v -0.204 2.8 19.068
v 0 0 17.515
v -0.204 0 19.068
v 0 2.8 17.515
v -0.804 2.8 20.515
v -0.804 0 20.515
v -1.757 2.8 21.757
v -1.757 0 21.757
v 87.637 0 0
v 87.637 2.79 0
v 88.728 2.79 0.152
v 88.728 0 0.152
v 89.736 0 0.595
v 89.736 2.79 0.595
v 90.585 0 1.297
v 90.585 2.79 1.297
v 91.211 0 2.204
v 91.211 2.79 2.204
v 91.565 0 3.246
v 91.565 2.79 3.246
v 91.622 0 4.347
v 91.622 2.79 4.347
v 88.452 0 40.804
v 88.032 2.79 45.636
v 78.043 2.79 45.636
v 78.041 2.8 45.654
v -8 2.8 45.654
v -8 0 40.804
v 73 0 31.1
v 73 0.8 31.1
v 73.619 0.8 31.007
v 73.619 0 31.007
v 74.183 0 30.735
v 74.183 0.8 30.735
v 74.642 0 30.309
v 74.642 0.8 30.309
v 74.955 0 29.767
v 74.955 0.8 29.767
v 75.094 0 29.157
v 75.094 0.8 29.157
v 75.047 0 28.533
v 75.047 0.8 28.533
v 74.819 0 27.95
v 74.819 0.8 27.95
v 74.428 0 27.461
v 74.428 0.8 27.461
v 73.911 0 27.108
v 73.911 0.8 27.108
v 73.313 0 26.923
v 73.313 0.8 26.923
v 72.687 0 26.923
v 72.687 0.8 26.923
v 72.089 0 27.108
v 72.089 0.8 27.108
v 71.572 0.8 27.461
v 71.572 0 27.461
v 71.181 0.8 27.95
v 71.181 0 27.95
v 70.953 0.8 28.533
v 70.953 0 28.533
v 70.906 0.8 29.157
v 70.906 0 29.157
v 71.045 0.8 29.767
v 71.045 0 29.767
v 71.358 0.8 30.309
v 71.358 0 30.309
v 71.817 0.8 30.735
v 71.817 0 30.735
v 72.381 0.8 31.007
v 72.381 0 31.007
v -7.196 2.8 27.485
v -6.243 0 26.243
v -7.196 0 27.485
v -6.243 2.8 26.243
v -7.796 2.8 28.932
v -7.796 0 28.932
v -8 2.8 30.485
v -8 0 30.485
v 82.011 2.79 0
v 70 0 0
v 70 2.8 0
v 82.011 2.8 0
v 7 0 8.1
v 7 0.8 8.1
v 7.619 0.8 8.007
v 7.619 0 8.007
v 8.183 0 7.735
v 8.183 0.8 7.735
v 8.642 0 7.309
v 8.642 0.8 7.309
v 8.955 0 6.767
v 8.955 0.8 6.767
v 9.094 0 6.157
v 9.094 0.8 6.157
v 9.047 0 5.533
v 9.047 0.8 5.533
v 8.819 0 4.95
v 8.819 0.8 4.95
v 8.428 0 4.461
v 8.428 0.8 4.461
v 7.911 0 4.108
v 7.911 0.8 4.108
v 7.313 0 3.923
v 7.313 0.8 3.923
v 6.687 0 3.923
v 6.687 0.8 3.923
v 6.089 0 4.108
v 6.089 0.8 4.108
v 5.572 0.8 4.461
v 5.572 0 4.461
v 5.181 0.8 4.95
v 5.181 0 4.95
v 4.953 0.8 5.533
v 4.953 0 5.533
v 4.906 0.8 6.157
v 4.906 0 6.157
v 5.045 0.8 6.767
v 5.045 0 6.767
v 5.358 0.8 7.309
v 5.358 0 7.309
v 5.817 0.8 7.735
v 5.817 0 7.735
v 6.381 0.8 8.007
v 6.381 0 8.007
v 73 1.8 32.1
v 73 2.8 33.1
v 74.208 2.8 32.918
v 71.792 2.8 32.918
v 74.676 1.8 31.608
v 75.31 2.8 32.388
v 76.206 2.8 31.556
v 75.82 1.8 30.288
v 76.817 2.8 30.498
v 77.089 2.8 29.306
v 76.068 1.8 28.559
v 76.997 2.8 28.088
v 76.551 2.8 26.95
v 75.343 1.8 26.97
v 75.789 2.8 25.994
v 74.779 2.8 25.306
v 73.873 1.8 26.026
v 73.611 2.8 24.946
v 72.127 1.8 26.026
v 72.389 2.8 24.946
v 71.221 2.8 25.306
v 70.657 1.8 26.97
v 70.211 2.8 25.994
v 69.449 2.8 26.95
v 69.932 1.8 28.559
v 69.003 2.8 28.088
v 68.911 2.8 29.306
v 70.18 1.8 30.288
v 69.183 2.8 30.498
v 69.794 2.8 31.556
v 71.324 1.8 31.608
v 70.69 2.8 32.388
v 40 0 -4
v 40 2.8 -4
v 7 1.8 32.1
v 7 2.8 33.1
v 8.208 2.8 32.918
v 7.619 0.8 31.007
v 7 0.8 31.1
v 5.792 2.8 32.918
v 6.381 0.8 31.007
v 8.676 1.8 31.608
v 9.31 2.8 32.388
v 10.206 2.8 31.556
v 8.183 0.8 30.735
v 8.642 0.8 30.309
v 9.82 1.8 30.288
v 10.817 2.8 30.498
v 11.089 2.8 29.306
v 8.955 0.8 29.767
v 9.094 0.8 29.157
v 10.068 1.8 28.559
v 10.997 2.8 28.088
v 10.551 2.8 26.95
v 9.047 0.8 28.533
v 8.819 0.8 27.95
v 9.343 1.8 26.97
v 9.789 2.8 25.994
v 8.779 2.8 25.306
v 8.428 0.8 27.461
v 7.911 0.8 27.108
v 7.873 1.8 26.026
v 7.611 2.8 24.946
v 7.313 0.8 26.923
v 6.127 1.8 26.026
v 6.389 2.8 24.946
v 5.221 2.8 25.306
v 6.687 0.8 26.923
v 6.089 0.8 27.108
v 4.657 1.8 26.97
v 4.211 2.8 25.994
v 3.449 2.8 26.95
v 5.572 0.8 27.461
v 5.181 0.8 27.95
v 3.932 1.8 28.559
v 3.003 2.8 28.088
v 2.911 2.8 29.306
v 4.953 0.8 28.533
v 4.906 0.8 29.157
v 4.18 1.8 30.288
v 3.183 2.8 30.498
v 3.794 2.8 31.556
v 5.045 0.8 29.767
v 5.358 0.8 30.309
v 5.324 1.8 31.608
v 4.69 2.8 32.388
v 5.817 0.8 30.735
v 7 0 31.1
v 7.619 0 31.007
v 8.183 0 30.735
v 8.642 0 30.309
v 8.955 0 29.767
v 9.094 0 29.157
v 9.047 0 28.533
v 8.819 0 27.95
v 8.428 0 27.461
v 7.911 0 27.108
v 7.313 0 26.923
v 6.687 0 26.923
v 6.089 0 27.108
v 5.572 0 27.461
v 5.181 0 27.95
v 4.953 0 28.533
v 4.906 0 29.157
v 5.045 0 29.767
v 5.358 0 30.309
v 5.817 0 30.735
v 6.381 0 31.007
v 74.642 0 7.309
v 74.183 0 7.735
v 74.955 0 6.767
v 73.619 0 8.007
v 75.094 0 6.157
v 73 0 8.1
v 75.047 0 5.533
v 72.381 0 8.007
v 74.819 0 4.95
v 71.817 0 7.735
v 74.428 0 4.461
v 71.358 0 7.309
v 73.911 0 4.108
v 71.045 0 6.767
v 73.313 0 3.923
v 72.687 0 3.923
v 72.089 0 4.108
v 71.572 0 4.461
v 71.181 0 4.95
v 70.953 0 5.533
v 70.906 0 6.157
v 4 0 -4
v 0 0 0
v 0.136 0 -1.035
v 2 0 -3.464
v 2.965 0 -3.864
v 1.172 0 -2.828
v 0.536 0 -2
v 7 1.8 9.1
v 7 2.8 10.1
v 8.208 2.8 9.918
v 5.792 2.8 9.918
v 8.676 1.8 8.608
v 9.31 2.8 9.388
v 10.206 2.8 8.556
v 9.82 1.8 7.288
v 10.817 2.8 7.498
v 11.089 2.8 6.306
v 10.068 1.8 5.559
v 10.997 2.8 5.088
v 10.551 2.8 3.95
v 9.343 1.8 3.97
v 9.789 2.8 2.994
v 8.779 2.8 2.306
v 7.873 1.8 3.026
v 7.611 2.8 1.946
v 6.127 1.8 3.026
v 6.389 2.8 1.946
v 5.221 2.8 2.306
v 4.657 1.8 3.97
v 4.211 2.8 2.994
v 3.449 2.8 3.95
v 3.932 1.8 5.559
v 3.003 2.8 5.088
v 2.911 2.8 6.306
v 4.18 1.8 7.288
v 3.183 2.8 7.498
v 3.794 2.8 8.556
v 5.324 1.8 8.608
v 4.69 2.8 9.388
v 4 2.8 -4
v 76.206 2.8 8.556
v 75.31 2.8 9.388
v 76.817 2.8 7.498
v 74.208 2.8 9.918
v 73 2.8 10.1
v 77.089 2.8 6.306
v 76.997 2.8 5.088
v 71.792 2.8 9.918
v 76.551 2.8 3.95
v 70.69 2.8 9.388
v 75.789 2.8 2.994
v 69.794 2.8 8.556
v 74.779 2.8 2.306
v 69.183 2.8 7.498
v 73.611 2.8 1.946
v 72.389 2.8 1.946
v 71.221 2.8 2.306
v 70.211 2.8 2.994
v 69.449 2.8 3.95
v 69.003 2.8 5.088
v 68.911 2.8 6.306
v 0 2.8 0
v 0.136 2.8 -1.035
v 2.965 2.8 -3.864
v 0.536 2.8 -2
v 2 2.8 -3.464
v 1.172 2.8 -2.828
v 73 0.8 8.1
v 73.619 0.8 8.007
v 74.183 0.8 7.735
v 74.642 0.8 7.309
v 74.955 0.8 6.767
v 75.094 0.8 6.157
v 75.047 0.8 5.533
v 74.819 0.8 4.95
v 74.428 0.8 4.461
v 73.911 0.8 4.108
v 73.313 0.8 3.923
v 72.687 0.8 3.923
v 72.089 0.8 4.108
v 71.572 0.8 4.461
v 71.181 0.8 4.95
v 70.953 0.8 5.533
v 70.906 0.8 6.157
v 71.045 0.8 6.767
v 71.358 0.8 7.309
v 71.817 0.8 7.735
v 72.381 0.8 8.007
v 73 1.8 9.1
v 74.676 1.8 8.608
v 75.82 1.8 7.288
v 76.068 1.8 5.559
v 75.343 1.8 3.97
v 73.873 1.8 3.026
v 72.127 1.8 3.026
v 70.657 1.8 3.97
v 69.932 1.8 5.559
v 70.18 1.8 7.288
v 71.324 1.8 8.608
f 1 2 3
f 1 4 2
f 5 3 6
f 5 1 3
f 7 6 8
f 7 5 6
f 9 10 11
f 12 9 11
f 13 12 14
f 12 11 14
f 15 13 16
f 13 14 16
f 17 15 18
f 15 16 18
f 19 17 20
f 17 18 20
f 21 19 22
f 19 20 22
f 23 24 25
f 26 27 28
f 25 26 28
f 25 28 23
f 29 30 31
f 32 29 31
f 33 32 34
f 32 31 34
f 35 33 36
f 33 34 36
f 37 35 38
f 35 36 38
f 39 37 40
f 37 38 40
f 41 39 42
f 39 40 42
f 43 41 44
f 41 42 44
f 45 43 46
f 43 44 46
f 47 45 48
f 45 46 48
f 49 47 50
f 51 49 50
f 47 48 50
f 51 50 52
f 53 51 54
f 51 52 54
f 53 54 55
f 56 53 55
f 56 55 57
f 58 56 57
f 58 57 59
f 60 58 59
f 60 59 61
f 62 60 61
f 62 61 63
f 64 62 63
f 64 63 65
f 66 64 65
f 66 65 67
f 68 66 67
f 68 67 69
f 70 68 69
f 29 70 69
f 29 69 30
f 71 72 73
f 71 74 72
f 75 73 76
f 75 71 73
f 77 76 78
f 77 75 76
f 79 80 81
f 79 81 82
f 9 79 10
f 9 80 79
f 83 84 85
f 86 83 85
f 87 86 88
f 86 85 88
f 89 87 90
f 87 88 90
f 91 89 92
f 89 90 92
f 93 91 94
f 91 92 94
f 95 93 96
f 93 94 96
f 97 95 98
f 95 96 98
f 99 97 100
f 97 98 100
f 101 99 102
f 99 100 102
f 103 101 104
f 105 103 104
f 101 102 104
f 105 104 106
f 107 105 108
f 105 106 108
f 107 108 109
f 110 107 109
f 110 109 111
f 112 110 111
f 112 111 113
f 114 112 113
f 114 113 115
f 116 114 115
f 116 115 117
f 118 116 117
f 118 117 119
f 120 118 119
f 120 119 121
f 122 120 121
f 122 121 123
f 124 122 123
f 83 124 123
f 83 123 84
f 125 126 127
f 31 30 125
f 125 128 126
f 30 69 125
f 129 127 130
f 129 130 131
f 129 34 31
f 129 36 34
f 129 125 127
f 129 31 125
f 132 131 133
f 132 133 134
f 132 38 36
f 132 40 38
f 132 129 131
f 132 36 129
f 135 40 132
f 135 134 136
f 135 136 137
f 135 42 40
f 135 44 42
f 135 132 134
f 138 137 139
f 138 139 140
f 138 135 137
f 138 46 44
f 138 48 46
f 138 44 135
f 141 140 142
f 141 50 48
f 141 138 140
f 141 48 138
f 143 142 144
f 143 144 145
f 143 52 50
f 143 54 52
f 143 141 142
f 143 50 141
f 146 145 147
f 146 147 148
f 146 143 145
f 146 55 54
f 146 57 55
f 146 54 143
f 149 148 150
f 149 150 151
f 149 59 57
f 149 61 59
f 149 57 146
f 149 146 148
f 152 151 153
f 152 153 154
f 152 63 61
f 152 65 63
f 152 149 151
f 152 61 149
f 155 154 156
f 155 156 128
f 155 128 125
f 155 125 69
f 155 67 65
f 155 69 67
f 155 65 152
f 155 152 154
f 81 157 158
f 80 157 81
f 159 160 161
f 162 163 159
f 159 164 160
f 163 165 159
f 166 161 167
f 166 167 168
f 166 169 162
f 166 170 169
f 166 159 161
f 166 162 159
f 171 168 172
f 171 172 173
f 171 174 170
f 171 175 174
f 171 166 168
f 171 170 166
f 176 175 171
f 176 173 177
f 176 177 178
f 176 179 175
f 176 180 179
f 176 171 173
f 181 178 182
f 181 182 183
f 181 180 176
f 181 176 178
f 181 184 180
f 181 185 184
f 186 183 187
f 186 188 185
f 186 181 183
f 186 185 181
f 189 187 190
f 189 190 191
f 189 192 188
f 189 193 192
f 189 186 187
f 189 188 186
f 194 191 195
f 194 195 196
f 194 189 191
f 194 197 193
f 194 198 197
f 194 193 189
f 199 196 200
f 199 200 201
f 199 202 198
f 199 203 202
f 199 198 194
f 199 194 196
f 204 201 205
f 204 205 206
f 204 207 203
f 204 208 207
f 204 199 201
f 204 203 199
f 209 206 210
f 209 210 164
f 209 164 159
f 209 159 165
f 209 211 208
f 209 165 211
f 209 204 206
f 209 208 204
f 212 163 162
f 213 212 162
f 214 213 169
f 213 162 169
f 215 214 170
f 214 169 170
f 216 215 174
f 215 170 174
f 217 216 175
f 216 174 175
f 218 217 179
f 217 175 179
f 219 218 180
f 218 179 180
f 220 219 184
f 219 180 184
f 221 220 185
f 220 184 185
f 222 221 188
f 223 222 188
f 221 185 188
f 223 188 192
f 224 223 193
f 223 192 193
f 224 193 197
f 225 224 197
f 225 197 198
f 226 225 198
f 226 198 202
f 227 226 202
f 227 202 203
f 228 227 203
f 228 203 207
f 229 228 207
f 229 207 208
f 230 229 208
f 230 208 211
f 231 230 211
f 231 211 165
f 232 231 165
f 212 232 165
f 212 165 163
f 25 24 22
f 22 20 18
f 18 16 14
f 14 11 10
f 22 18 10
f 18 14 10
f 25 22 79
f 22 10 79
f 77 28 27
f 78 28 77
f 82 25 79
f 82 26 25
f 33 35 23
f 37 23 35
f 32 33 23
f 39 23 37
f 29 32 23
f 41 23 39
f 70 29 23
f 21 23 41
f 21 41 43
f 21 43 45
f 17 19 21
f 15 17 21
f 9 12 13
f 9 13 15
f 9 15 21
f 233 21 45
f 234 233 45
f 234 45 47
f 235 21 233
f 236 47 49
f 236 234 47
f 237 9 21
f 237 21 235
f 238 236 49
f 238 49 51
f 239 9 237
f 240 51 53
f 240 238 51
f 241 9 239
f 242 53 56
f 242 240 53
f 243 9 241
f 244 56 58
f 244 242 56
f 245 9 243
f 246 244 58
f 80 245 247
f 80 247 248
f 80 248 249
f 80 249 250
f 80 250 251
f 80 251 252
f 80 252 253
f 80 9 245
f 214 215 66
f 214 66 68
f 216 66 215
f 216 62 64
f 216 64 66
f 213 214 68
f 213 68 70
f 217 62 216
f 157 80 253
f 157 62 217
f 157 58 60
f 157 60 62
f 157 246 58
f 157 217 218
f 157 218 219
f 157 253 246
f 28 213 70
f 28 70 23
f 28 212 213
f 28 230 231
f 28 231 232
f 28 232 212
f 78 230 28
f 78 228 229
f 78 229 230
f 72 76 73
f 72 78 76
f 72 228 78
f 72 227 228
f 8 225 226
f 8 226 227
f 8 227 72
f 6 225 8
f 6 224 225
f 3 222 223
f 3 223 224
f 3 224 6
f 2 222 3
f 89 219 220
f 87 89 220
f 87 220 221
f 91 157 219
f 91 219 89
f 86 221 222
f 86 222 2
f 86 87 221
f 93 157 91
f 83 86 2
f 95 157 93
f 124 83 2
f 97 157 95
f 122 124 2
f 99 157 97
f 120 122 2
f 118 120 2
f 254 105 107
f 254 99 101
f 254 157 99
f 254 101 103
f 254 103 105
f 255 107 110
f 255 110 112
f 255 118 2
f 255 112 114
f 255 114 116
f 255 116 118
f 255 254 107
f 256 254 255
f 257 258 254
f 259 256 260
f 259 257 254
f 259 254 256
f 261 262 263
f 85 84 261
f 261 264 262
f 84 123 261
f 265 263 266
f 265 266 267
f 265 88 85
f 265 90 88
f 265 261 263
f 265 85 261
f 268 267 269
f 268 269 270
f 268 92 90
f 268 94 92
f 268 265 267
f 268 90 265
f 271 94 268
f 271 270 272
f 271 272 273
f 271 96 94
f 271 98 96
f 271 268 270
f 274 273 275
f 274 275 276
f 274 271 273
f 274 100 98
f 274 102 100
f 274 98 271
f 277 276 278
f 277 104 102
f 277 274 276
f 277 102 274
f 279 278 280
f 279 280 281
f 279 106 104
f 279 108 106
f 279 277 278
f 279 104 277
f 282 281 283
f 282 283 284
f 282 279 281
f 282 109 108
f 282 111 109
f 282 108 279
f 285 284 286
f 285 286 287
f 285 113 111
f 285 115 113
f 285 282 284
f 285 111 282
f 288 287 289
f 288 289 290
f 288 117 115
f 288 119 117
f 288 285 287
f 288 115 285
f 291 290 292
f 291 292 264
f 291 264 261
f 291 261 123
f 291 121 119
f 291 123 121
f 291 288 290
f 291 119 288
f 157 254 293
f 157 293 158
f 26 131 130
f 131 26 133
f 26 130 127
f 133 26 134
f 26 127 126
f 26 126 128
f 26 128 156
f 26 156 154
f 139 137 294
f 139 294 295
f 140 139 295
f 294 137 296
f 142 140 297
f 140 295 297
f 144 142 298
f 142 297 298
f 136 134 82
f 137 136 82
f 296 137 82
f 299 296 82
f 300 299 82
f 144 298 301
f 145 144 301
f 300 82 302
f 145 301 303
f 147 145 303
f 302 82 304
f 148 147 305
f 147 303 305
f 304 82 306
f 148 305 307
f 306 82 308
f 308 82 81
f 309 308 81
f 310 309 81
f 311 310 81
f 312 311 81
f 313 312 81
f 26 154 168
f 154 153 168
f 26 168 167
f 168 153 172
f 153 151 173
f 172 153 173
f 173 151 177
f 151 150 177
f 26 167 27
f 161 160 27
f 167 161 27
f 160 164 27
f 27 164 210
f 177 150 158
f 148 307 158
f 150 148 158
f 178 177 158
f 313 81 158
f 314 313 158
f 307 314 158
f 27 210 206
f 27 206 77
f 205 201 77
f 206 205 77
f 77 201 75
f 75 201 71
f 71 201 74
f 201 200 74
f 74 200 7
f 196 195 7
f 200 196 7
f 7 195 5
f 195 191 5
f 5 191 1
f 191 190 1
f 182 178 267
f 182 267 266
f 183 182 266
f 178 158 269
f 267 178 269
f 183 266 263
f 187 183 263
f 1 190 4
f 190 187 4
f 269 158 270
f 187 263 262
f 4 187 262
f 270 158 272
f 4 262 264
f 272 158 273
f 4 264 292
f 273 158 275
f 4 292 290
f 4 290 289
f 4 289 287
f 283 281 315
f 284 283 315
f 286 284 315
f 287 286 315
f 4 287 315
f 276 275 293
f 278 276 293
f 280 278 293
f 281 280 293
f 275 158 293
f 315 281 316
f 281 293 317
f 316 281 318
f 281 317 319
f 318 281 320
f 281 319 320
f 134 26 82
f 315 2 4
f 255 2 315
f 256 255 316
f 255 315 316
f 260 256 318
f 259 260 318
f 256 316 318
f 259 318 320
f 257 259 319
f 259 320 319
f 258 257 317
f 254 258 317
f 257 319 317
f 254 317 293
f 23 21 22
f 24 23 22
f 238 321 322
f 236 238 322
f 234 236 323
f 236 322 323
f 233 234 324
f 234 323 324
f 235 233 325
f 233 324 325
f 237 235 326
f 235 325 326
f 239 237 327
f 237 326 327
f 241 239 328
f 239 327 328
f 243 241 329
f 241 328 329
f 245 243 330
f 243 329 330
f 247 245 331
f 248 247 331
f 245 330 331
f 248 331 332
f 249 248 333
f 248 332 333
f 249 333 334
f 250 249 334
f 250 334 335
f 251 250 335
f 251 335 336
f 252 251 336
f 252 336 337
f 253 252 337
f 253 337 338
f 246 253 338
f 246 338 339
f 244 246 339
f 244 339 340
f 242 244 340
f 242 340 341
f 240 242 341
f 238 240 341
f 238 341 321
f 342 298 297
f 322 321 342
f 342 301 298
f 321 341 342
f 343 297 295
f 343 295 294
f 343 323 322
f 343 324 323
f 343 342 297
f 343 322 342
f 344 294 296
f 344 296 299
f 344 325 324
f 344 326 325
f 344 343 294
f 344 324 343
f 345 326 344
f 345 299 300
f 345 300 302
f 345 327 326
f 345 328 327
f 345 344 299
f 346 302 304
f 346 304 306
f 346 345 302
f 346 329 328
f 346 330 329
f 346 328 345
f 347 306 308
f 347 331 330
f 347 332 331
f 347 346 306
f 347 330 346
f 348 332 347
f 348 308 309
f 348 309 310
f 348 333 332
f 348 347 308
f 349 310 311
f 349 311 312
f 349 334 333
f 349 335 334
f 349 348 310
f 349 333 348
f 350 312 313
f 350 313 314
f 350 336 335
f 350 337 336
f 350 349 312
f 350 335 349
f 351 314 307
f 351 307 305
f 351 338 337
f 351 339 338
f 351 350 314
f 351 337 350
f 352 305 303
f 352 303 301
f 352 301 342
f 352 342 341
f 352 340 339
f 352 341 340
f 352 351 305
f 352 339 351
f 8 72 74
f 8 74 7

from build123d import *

# Parameters (mm, degrees)
BOSS_EXTRUDE1_DEPTH = 2.8
CHAMFER1_SIZE       = 3
CHAMFER1_SIZE_2     = 5.196152423
SKETCH2_R           = 2.1
CUT_EXTRUDE1_DEPTH  = 103.74283559
CHAMFER2_SIZE       = 2
FILLET1_R           = 6
FILLET2_R           = 4
CUT_EXTRUDE2_DEPTH  = 0.01


with BuildPart() as part:
    # Sketch1 → Boss-Extrude1 (new body)
    with BuildSketch(Plane(origin=(0, 0, 0), x_dir=(1, 0, 0), z_dir=(0, 1, 0))):
        Polygon((0, 4), (40, 4), (70, 0), (92, 0), (88, -46), (0, -46), (-8, -46), (-8, -28), (0, -20), align=None)
    extrude(amount=BOSS_EXTRUDE1_DEPTH)

    # Chamfer1
    # the kernel refuses this chamfer: 5.196152423, 3 mm, written as the material it takes off along each edge
    with BuildSketch(Plane(origin=(-21.442891912, 0, 46), x_dir=(0, 0.9983227437537926, 0.05789386240267091), z_dir=(1, 0, 0))) as chamfer1_piece_1:
        Polygon((CHAMFER1_SIZE * 0.998322743754, -CHAMFER1_SIZE * 0.0578938624027), (-CHAMFER1_SIZE_2 * 0.0578938623994, -CHAMFER1_SIZE_2 * 0.998322743697), (0, 0), align=None)
    extrude(amount=122.885783824, mode=Mode.SUBTRACT)

    # Sketch2 → Cut-Extrude1 (cut, through all)
    with BuildSketch(Plane(origin=(0, 2.8, 0), x_dir=(1, 0, 0), z_dir=(0, 1, 0))):
        with Locations(Location((7, -6, 0), (0, 0, 270))):
            Circle(SKETCH2_R)
        with Locations(Location((7, -29, 0), (0, 0, 270))):
            Circle(SKETCH2_R)
        with Locations(Location((73, -6, 0), (0, 0, 270))):
            Circle(SKETCH2_R)
        with Locations(Location((73, -29, 0), (0, 0, 270))):
            Circle(SKETCH2_R)
    extrude(amount=-CUT_EXTRUDE1_DEPTH, mode=Mode.SUBTRACT)

    # Chamfer2
    chamfer2_edges = [part.edges().sort_by_distance(p)[0] for p in [
        (7, 2.8, 26.9),
        (73, 2.8, 3.9),
        (73, 2.8, 26.9),
        (7, 2.8, 3.9),
    ]]
    chamfer(chamfer2_edges, length=CHAMFER2_SIZE)

    # Fillet1
    fillet1_edges = [part.edges().sort_by_distance(p)[0] for p in [
        (-8, 1.4, 28),
        (0, 1.4, 20),
    ]]
    fillet(fillet1_edges, radius=FILLET1_R)

    # Fillet2
    fillet2_edges = [part.edges().sort_by_distance(p)[0] for p in [
        (0, 1.4, -4),
        (92, 1.4, 0),
    ]]
    fillet(fillet2_edges, radius=FILLET2_R)

    # Sketch3 → Cut-Extrude2 (cut)
    with BuildSketch(Plane(origin=(0, 2.8, 0), x_dir=(1, 0, 0), z_dir=(0, 1, 0))):
        Polygon((78.041306422, -45.653589838), (82.011183799, 0), (92.341682138, 0.80141962), (88.030122623, -45.653589838), align=None)
    extrude(amount=-CUT_EXTRUDE2_DEPTH, mode=Mode.SUBTRACT)


solid = part.part
